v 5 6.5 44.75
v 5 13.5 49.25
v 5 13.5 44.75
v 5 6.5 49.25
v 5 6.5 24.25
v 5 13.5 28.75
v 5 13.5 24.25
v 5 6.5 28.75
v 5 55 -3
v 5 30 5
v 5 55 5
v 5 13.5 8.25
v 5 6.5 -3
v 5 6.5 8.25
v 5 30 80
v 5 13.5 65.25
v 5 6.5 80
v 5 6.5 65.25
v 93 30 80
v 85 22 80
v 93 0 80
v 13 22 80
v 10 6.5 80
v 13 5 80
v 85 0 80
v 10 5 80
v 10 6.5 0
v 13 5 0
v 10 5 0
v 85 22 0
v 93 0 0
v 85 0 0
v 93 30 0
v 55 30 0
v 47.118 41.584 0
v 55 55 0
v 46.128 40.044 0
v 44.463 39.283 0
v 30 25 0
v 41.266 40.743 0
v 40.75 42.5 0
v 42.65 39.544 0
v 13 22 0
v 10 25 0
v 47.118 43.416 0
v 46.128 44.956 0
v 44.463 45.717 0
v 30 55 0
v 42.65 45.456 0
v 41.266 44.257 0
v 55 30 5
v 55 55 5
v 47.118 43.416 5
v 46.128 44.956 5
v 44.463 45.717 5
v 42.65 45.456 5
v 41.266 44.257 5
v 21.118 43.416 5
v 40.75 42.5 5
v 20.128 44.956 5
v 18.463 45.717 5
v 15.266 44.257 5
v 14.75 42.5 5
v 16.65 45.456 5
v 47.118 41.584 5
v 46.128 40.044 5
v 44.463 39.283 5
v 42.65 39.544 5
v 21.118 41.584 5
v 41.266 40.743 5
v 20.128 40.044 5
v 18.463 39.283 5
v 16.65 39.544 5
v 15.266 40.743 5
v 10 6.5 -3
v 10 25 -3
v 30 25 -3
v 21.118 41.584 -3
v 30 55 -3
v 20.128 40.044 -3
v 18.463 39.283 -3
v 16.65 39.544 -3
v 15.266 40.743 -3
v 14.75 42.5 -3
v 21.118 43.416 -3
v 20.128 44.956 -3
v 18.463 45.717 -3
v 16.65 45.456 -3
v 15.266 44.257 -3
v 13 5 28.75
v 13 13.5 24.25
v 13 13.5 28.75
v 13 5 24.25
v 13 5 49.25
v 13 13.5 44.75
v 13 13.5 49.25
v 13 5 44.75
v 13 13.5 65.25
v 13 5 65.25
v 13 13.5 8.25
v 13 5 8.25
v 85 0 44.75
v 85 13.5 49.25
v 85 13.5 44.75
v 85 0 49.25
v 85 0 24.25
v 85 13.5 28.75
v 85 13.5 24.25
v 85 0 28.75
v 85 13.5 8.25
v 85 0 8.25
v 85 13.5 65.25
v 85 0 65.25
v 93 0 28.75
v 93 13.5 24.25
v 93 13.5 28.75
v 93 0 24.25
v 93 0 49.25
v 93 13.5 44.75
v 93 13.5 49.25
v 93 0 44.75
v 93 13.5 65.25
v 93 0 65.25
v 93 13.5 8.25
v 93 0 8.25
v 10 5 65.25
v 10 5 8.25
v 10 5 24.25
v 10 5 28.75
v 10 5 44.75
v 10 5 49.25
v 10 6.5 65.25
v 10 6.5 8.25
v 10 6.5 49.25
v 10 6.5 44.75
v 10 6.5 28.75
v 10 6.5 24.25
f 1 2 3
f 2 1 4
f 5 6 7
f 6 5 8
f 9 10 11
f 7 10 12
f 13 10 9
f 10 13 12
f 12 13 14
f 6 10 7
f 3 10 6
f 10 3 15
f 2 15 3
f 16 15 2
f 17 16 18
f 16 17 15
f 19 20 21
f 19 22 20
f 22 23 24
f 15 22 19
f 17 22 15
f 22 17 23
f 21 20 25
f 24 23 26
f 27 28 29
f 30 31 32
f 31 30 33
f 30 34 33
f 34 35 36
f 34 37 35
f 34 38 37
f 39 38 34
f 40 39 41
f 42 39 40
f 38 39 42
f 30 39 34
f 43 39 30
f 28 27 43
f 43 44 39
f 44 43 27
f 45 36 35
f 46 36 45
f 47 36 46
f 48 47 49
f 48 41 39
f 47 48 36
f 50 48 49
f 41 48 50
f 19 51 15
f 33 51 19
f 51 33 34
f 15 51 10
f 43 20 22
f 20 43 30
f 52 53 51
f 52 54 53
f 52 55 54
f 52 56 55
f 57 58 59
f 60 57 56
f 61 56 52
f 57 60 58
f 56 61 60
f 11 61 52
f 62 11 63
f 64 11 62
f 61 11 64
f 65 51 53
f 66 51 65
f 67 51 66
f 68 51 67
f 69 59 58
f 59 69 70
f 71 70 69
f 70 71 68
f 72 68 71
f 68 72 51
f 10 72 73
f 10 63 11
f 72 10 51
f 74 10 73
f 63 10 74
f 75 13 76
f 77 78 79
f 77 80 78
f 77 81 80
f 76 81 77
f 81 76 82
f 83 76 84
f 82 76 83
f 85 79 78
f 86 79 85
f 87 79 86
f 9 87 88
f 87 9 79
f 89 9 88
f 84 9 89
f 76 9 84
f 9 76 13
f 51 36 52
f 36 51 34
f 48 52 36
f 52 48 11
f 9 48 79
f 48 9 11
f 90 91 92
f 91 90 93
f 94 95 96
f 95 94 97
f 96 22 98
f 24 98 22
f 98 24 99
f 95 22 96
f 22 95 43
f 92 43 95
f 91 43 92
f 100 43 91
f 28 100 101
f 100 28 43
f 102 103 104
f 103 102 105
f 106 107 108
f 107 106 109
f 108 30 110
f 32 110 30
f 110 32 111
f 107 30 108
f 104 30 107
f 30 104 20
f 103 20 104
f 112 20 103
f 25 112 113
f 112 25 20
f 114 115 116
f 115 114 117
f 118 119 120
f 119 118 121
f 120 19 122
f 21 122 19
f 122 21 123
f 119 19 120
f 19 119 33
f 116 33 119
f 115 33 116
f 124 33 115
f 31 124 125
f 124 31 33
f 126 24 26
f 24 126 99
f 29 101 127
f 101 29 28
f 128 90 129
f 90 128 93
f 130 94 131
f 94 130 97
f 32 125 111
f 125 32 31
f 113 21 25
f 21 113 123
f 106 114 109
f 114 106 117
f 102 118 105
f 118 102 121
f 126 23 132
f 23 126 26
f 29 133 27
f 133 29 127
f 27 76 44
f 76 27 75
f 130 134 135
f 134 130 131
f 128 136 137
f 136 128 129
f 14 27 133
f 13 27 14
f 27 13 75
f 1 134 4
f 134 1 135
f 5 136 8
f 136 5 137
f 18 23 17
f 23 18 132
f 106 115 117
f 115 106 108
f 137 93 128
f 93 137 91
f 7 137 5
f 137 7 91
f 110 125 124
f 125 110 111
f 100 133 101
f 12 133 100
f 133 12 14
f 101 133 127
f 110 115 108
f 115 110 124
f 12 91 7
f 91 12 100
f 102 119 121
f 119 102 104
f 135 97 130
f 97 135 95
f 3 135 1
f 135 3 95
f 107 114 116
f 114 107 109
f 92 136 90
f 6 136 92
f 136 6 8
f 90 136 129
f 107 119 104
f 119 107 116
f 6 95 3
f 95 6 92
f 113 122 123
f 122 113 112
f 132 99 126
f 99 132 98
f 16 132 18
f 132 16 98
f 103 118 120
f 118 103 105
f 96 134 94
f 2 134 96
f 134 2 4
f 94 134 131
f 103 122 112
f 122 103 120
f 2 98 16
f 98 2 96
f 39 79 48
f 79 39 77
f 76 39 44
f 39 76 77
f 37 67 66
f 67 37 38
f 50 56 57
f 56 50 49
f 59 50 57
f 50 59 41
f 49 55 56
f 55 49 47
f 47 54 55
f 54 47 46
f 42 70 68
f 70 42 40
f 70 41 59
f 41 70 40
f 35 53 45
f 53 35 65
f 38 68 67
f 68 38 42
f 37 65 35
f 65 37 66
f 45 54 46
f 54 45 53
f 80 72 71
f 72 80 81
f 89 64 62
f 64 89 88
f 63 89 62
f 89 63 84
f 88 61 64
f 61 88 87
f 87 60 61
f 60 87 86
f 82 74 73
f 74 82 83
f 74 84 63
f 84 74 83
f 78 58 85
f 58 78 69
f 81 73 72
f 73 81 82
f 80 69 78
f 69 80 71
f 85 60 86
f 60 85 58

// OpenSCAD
//
//if (accessories=="ON"){
//	color([222/255,184/255,135/255]) translate([-50,33.5,-3]) board();
//	translate([-10,15,0]) Arduino(0,0,0);
//} 
//if (mode=="EXPLODED"){
//	baseWCuts();
//	translate([-45,-80,30]) backDoor();
//	translate([0,30,30]) frontPanel();
//	translate([0,30,30]) mirror([1,0,0]) frontPanel();
//}
//if (mode=="ASSEMBLED"){
//	baseWCuts();
//	translate([-45,-50,0]) backDoor();
//	frontPanel();
//	mirror([1,0,0]) frontPanel();
//}
//if (mode=="PARTS"){
//	baseWCuts();
//	translate([280,-10,40]) rotate([270,0,0]) frontPanel();
//	translate([-250,0,10]) rotate([270,0,0]) backDoor();
//	translate([230,-10,40]) mirror([1,0,0]) rotate([270,0,0]) frontPanel();
//
//}

translate([-40,-30,0]) mirror([1,0,0]) frontPanel();

//
///////////////////////////////
/* MAIN CONSTRUCTOR MODULES */
//////////////////////////////


//Creates exact front panel with cuts using frontPanelBasic()
module frontPanel(){ 
	difference(){
		translate([-126.5,52,0]) frontPanelBasic();
		baseWCuts();
		translate([-50,33.5,-3]) board();
		translate([65,10,95]) rotate([90,0,0]) cylinder(r=6.5,h=20);
		translate([-58,72.5,-10]) cylinder(r=3.25,h=20);//cuts panel screw holes
		translate([-84,72.5,-10]) cylinder(r=3.25,h=20);
	}
}

//Creates basic block front panel without cuts
module frontPanelBasic(){ 
	union(){
		cube([81.5,8,80]);
		translate([31.5,0,-3]) cube([50,33,8]);
		translate([73.5,-20,-5]) cube([8,20,85]);
		translate([-6.5,-23,0]) cube([8,31,80]);
	}
}

//Creates full base with sides, floor, and all necessary cuts
module baseWCuts(){
	difference(){
		base();
		translate([-50,33.5,-3]) board(); //cuts board
		translate([-10,15,0]) Arduino(0,0,0); //cuts arduino
		translate([-45,-50,0]) backDoor(); //cuts back door
		translate([-70,55,-3]) cube([140,30,3]); //cuts indent in prongs
		translate([-62.5,10,95]) rotate([90,0,0]) cylinder(r=3.25,h=20); //cuts hanger
		translate([62.5,10,95]) rotate([90,0,0]) cylinder(r=3.25,h=20);
		translate([-58,72.5,-10]) cylinder(r=3.25,h=20);//cuts panel screw holes
		translate([-84,72.5,-10]) cylinder(r=3.25,h=20);
		translate([58,72.5,-10]) cylinder(r=3.25,h=20);
		translate([84,72.5,-10]) cylinder(r=3.25,h=20);
		translate([-53,-5,2]) cube([15,15,15]); //cuts arduino extension port
		translate([-50,36.5,-3]) cube([100,20,3]);
	}
}

//Creates simple base with floor and sides
module base(){
	union(){
		translate([-53,-50,-8]) floor();
		translate([-53,-50,0]) sides();
		translate([-80,-4,80]) cube([35,12,25]); //creates top hinges 
		translate([45,-4,80]) cube([35,12,25]);
	}
}

//Creates back door that will fit into slots in the base.
module backDoor(){
	union(){
		cube([90,8,80]);
	
		translate([19.75,1.5,-5]) cube([5,5,5]); //bottom notches
		translate([44.5,1.5,-5]) cube([5,5,5]);
		translate([69.25,1.5,-5]) cube([5,5,5]);
	
		translate([-5,3,75]) cube([5,5,5]);//top notches
		translate([90,3,75]) cube([5,5,5]);
	
		translate([23,0,40]) rotate([90,0,0]) scale([1,1,1.5]) drawtext("metaLab."); //text
	}
}

//Creates walls including slants
module sides(){

	cube([8,85,80]);
	translate([98,0,0]) cube([8,85,80]);
	translate([-80,70,0]) slant();
	translate([186,70,0]) mirror([1,0,0]) slant();

}

//creates slanted L shaped wall
module slant(){
	polyhedron(
	points = [ [0,0,0],[80,0,0],[0,10,0],[8,10,0],[8,8,0], [80,8,0],
				[0,-20,80],[80,-20,80],[0,10,80],[8,10,80],[8,-12,80],
				[80,-12,80] ],

	faces = [ [0,1,5,4,3,2] ,[6,8,9,10,11,7], [2,8,6,0],
				[0,6,7,1], [1,7,11,5], [5,11,10,4], [4,10,9,3],
				[3,9,8,2]]


	);
}

//Creates floor of the enclosure
module floor(){
	union(){
		cube([106,86,8]);
		
		translate([-80,70,0]) cube([80,40,8]);//wings
		translate([106,70,0]) cube([80,40,8]);
	
		translate([-42,85,0]) cube([50,50,8]); //prongs
		translate([98,85,0]) cube([50,50,8]);
		diagonal();
		translate([106,0,0]) mirror([1,0,0]) diagonal();
	}
}

//Creates triangle inlet for floor
module diagonal(){
	polyhedron(
		points = [ [0,50,0],[0,70,0],[-20,70,0],[0,50,8],[0,70,8],[-20,70,8]],
		faces = [ [2,1,0],[3,4,5],[2,0,3,5],[0,1,4,3],[1,2,5,4] ]
	);
}

//Models enclosed circuit board
module board(){
	union(){
		cube([100,3,85]);
		translate([-87.5,-6,11.25]) cube([95,16,16]);//left
		translate([-87.5,-6,31.75]) cube([95,16,16]);
		translate([-87.5,-6,52.25]) cube([95,16,16]);
	
		translate([92.5,-6,11.25]) cube([95,16,16]);//right
		translate([92.5,-6,31.75]) cube([95,16,16]);
		translate([92.5,-6,52.25]) cube([95,16,16]);
	}
}

/////////////////////////
//TEXT DRAWING MODULES//
////////////////////////
//You can ignore these//

module drawtext(text) {
	//Characters
	chars = " !\"#$%&'()*+,-./0123456789:;<=>?@ABCDEFGHIJKLMNOPQRSTUVWXYZ[\\]^_`abcdefghijklmnopqrstuvwxyz{|}";

	//Chracter table defining 5x7 characters
	//Adapted from: http://www.geocities.com/dinceraydin/djlcdsim/chartable.js
	char_table = [ [ 0, 0, 0, 0, 0, 0, 0],
                  [ 4, 0, 4, 4, 4, 4, 4],
                  [ 0, 0, 0, 0,10,10,10],
                  [10,10,31,10,31,10,10],
                  [ 4,30, 5,14,20,15, 4],
                  [ 3,19, 8, 4, 2,25,24],
                  [13,18,21, 8,20,18,12],
                  [ 0, 0, 0, 0, 8, 4,12],
                  [ 2, 4, 8, 8, 8, 4, 2],
                  [ 8, 4, 2, 2, 2, 4, 8],
                  [ 0, 4,21,14,21, 4, 0],
                  [ 0, 4, 4,31, 4, 4, 0],
                  [ 8, 4,12, 0, 0, 0, 0],
                  [ 0, 0, 0,31, 0, 0, 0],
                  [12,12, 0, 0, 0, 0, 0],
                  [ 0,16, 8, 4, 2, 1, 0],
                  [14,17,25,21,19,17,14],
                  [14, 4, 4, 4, 4,12, 4],
                  [31, 8, 4, 2, 1,17,14],
                  [14,17, 1, 2, 4, 2,31],
                  [ 2, 2,31,18,10, 6, 2],
                  [14,17, 1, 1,30,16,31],
                  [14,17,17,30,16, 8, 6],
                  [ 8, 8, 8, 4, 2, 1,31],
                  [14,17,17,14,17,17,14],
                  [12, 2, 1,15,17,17,14],
                  [ 0,12,12, 0,12,12, 0],
                  [ 8, 4,12, 0,12,12, 0],
                  [ 2, 4, 8,16, 8, 4, 2],
                  [ 0, 0,31, 0,31, 0, 0],
                  [16, 8, 4, 2, 4, 8,16],
                  [ 4, 0, 4, 2, 1,17,14],
                  [14,21,21,13, 1,17,14],
                  [17,17,31,17,17,17,14],
                  [30,17,17,30,17,17,30],
                  [14,17,16,16,16,17,14],
                  [30,17,17,17,17,17,30],
                  [31,16,16,30,16,16,31],
                  [16,16,16,30,16,16,31],
                  [15,17,17,23,16,17,14],
                  [17,17,17,31,17,17,17],
                  [14, 4, 4, 4, 4, 4,14],
                  [12,18, 2, 2, 2, 2, 7],
                  [17,18,20,24,20,18,17],
                  [31,16,16,16,16,16,16],
                  [17,17,17,21,21,27,17],
                  [17,17,19,21,25,17,17],
                  [14,17,17,17,17,17,14],
                  [16,16,16,30,17,17,30],
                  [13,18,21,17,17,17,14],
                  [17,18,20,30,17,17,30],
                  [30, 1, 1,14,16,16,15],
                  [ 4, 4, 4, 4, 4, 4,31],
                  [14,17,17,17,17,17,17],
                  [ 4,10,17,17,17,17,17],
                  [10,21,21,21,17,17,17],
                  [17,17,10, 4,10,17,17],
                  [ 4, 4, 4,10,17,17,17],
                  [31,16, 8, 4, 2, 1,31],
                  [14, 8, 8, 8, 8, 8,14],
                  [ 0, 1, 2, 4, 8,16, 0],
                  [14, 2, 2, 2, 2, 2,14],
                  [ 0, 0, 0, 0,17,10, 4],
                  [31, 0, 0, 0, 0, 0, 0],
                  [ 0, 0, 0, 0, 2, 4, 8],
                  [15,17,15, 1,14, 0, 0],
                  [30,17,17,25,22,16,16],
                  [14,17,16,16,14, 0, 0],
                  [15,17,17,19,13, 1, 1],
                  [14,16,31,17,14, 0, 0],
                  [ 8, 8, 8,28, 8, 9, 6],
                  [14, 1,15,17,15, 0, 0],
                  [17,17,17,25,22,16,16],
                  [14, 4, 4, 4,12, 0, 4],
                  [12,18, 2, 2, 2, 6, 2],
                  [18,20,24,20,18,16,16],
                  [14, 4, 4, 4, 4, 4,12],
                  [17,17,21,21,26, 0, 0],
                  [17,17,17,25,22, 0, 0],
                  [14,17,17,17,14, 0, 0],
                  [16,16,30,17,30, 0, 0],
                  [ 1, 1,15,19,13, 0, 0],
                  [16,16,16,25,22, 0, 0],
                  [30, 1,14,16,15, 0, 0],
                  [ 6, 9, 8, 8,28, 8, 8],
                  [13,19,17,17,17, 0, 0],
                  [ 4,10,17,17,17, 0, 0],
                  [10,21,21,17,17, 0, 0],
                  [17,10, 4,10,17, 0, 0],
                  [14, 1,15,17,17, 0, 0],
                  [31, 8, 4, 2,31, 0, 0],
                  [ 2, 4, 4, 8, 4, 4, 2],
                  [ 4, 4, 4, 4, 4, 4, 4],
                  [ 8, 4, 4, 2, 4, 4, 8] ];

	//Binary decode table
	dec_table = [ "00000", "00001", "00010", "00011", "00100", "00101",
  	            "00110", "00111", "01000", "01001", "01010", "01011",
  	            "01100", "01101", "01110", "01111", "10000", "10001",
  	            "10010", "10011", "10100", "10101", "10110", "10111",
	            "11000", "11001", "11010", "11011", "11100", "11101",
	            "11110", "11111" ];

	//Process string one character at a time
	for(itext = [0:len(text)-1]) {
		//Convert character to index
		assign(ichar = search(text[itext],chars,1)[0]) {
			//Decode character - rows
			for(irow = [0:6]) {
				assign(val = dec_table[char_table[ichar][irow]]) {
					//Decode character - cols
					for(icol = [0:4]) {
						assign(bit = search(val[icol],"01",1)[0]) {
							if(bit) {
								//Output cube
								translate([icol + (6*itext), irow, 0])
									cube([1.0001,1.0001,1]);
							}
						}
					}
				}
			}
		}
	}
}


////////////////////////////
//ARDUINO DRAWING MODULES//
///////////////////////////
//You can ignore these//

board_height = 4;

module Arduino(solid_holes, combined_headers, extend_ports)
{
	echo(str("solid_holes: ", solid_holes));
	echo(str("combined_headers: ", combined_headers));
	echo(str("extend_ports: ", extend_ports));

	if (solid_holes == 1)
	{
		echo("solid holes");
		union()
		{
			Board();
			USB(extend_ports);
			PowerPlug(extend_ports);
			FemaleHeaders(combined_headers);
			MaleHeaders();
			ResetButton();
			ATMega();
			MountingHoles();
		}
	}
	else
	{
		echo("regular holes");
		difference()
		{
			union()
			{
				Board();
				USB(extend_ports);
				PowerPlug(extend_ports);
				FemaleHeaders(combined_headers);
				MaleHeaders();
				ResetButton();
				ATMega();
			}
			MountingHoles();
		}
	}
}

module ResetButton()
{
	translate([39, -26, board_height])
	{
		color([0.8, 0.8, 0.8])
		cube([6, 6, 2.2]);
		
		color([0.6, 0.4, 0.2])
		translate([3, 3, 0]) cylinder(r=1.4, h=3.5, $fn=25);
	}
}

module MaleHeaders()
{
	color([0.6, 0.6, 0.6])
	translate([0, 0, board_height])
	{
		translate([0, -7, 0]) cube([7, 5, 9.2]);
		translate([47.5, -26, 0]) cube([5, 7, 9.2]);
	}
}

module ATMega()
{
	color([0.3, 0.3, 0.3])
	translate([14, -39, board_height])
	{
		cube([35.5, 10, 7.5]);
	}
}

module FemaleHeaders(combined)
{
	color([0.3, 0.3, 0.3])
	translate([0, 0, board_height])
	{
		translate([0, -1, 0])
		{
			translate([7, 0, 0])
			{
				if(combined == 1)
				{
					cube([43, 2, 8.2]);
				}
				else
				{
					cube([21, 2, 8.2]);
					translate([22, 0, 0]) cube([21, 2, 8.2]);
				}
			}
		}

		translate([0, -50, 0])
		{
			translate([17, 0, 0])
			{
				if(combined == 1)
				{
					cube([33, 2, 8.2]);
				}
				else
				{
					cube([15.5, 2, 8.2]);
					translate([17.5, 0, 0]) cube([15.5, 2, 8.2]);
				}
			}
		}
	}
}

module PowerPlug(extended)
{
	if(extended == 1)
	{
		translate([-26.893, -47.4929962, board_height])
		color([0.3, 0.3, 0.3])
		cube([24, 9, 11]);
	}
	else
	{
		translate([-16.893, -47.4929962, board_height])
		color([0.3, 0.3, 0.3])
		cube([14, 9, 11]);
	}
}

module USB(extended)
{
	if(extended == 1)
	{
		translate([-31.465, -18.5623962, board_height])
		color([0.8, 0.8, 0.8])
		cube([26, 12, 11]);
	}
	else
	{
		translate([-61.465, -18.5623962, board_height])
		color([0.8, 0.8, 0.8])
		cube([56, 12, 11]);
	}
}


module Board()
{
	color([0, 0.6, 0.8])
	linear_extrude(height = board_height, convexity = 10, twist = 0)
	{
		polygon( points = [ [-15.115, 2.545],
						[49.4, 2.545],
						[50.925, 1.021],
						[50.925, -10.409],
						[53.465, -12.949],
						[53.465, -45.715],
						[50.925, -48.255],
						[50.925, -50.795],
						[-15.115, -50.795] ],
				paths = [[0, 1, 2, 3, 4, 5, 6, 7, 8]],
				convexity = 10);
	}
}

module MountingHoles()
{
	translate([0, 0, -10])
	{
		ArduinoHole(25);
		translate([-1.0929112, -48.4026972, 0]) ArduinoHole(25);
		translate([51, -15.25, 0]) ArduinoHole(25);
		translate([51, -43.25, 0]) ArduinoHole(25);
	}
}

module ArduinoHole(length)
{
	color([0.7, 0.7, 0.7])
	cylinder(r=1.5, h=length, $fn=25);
}
